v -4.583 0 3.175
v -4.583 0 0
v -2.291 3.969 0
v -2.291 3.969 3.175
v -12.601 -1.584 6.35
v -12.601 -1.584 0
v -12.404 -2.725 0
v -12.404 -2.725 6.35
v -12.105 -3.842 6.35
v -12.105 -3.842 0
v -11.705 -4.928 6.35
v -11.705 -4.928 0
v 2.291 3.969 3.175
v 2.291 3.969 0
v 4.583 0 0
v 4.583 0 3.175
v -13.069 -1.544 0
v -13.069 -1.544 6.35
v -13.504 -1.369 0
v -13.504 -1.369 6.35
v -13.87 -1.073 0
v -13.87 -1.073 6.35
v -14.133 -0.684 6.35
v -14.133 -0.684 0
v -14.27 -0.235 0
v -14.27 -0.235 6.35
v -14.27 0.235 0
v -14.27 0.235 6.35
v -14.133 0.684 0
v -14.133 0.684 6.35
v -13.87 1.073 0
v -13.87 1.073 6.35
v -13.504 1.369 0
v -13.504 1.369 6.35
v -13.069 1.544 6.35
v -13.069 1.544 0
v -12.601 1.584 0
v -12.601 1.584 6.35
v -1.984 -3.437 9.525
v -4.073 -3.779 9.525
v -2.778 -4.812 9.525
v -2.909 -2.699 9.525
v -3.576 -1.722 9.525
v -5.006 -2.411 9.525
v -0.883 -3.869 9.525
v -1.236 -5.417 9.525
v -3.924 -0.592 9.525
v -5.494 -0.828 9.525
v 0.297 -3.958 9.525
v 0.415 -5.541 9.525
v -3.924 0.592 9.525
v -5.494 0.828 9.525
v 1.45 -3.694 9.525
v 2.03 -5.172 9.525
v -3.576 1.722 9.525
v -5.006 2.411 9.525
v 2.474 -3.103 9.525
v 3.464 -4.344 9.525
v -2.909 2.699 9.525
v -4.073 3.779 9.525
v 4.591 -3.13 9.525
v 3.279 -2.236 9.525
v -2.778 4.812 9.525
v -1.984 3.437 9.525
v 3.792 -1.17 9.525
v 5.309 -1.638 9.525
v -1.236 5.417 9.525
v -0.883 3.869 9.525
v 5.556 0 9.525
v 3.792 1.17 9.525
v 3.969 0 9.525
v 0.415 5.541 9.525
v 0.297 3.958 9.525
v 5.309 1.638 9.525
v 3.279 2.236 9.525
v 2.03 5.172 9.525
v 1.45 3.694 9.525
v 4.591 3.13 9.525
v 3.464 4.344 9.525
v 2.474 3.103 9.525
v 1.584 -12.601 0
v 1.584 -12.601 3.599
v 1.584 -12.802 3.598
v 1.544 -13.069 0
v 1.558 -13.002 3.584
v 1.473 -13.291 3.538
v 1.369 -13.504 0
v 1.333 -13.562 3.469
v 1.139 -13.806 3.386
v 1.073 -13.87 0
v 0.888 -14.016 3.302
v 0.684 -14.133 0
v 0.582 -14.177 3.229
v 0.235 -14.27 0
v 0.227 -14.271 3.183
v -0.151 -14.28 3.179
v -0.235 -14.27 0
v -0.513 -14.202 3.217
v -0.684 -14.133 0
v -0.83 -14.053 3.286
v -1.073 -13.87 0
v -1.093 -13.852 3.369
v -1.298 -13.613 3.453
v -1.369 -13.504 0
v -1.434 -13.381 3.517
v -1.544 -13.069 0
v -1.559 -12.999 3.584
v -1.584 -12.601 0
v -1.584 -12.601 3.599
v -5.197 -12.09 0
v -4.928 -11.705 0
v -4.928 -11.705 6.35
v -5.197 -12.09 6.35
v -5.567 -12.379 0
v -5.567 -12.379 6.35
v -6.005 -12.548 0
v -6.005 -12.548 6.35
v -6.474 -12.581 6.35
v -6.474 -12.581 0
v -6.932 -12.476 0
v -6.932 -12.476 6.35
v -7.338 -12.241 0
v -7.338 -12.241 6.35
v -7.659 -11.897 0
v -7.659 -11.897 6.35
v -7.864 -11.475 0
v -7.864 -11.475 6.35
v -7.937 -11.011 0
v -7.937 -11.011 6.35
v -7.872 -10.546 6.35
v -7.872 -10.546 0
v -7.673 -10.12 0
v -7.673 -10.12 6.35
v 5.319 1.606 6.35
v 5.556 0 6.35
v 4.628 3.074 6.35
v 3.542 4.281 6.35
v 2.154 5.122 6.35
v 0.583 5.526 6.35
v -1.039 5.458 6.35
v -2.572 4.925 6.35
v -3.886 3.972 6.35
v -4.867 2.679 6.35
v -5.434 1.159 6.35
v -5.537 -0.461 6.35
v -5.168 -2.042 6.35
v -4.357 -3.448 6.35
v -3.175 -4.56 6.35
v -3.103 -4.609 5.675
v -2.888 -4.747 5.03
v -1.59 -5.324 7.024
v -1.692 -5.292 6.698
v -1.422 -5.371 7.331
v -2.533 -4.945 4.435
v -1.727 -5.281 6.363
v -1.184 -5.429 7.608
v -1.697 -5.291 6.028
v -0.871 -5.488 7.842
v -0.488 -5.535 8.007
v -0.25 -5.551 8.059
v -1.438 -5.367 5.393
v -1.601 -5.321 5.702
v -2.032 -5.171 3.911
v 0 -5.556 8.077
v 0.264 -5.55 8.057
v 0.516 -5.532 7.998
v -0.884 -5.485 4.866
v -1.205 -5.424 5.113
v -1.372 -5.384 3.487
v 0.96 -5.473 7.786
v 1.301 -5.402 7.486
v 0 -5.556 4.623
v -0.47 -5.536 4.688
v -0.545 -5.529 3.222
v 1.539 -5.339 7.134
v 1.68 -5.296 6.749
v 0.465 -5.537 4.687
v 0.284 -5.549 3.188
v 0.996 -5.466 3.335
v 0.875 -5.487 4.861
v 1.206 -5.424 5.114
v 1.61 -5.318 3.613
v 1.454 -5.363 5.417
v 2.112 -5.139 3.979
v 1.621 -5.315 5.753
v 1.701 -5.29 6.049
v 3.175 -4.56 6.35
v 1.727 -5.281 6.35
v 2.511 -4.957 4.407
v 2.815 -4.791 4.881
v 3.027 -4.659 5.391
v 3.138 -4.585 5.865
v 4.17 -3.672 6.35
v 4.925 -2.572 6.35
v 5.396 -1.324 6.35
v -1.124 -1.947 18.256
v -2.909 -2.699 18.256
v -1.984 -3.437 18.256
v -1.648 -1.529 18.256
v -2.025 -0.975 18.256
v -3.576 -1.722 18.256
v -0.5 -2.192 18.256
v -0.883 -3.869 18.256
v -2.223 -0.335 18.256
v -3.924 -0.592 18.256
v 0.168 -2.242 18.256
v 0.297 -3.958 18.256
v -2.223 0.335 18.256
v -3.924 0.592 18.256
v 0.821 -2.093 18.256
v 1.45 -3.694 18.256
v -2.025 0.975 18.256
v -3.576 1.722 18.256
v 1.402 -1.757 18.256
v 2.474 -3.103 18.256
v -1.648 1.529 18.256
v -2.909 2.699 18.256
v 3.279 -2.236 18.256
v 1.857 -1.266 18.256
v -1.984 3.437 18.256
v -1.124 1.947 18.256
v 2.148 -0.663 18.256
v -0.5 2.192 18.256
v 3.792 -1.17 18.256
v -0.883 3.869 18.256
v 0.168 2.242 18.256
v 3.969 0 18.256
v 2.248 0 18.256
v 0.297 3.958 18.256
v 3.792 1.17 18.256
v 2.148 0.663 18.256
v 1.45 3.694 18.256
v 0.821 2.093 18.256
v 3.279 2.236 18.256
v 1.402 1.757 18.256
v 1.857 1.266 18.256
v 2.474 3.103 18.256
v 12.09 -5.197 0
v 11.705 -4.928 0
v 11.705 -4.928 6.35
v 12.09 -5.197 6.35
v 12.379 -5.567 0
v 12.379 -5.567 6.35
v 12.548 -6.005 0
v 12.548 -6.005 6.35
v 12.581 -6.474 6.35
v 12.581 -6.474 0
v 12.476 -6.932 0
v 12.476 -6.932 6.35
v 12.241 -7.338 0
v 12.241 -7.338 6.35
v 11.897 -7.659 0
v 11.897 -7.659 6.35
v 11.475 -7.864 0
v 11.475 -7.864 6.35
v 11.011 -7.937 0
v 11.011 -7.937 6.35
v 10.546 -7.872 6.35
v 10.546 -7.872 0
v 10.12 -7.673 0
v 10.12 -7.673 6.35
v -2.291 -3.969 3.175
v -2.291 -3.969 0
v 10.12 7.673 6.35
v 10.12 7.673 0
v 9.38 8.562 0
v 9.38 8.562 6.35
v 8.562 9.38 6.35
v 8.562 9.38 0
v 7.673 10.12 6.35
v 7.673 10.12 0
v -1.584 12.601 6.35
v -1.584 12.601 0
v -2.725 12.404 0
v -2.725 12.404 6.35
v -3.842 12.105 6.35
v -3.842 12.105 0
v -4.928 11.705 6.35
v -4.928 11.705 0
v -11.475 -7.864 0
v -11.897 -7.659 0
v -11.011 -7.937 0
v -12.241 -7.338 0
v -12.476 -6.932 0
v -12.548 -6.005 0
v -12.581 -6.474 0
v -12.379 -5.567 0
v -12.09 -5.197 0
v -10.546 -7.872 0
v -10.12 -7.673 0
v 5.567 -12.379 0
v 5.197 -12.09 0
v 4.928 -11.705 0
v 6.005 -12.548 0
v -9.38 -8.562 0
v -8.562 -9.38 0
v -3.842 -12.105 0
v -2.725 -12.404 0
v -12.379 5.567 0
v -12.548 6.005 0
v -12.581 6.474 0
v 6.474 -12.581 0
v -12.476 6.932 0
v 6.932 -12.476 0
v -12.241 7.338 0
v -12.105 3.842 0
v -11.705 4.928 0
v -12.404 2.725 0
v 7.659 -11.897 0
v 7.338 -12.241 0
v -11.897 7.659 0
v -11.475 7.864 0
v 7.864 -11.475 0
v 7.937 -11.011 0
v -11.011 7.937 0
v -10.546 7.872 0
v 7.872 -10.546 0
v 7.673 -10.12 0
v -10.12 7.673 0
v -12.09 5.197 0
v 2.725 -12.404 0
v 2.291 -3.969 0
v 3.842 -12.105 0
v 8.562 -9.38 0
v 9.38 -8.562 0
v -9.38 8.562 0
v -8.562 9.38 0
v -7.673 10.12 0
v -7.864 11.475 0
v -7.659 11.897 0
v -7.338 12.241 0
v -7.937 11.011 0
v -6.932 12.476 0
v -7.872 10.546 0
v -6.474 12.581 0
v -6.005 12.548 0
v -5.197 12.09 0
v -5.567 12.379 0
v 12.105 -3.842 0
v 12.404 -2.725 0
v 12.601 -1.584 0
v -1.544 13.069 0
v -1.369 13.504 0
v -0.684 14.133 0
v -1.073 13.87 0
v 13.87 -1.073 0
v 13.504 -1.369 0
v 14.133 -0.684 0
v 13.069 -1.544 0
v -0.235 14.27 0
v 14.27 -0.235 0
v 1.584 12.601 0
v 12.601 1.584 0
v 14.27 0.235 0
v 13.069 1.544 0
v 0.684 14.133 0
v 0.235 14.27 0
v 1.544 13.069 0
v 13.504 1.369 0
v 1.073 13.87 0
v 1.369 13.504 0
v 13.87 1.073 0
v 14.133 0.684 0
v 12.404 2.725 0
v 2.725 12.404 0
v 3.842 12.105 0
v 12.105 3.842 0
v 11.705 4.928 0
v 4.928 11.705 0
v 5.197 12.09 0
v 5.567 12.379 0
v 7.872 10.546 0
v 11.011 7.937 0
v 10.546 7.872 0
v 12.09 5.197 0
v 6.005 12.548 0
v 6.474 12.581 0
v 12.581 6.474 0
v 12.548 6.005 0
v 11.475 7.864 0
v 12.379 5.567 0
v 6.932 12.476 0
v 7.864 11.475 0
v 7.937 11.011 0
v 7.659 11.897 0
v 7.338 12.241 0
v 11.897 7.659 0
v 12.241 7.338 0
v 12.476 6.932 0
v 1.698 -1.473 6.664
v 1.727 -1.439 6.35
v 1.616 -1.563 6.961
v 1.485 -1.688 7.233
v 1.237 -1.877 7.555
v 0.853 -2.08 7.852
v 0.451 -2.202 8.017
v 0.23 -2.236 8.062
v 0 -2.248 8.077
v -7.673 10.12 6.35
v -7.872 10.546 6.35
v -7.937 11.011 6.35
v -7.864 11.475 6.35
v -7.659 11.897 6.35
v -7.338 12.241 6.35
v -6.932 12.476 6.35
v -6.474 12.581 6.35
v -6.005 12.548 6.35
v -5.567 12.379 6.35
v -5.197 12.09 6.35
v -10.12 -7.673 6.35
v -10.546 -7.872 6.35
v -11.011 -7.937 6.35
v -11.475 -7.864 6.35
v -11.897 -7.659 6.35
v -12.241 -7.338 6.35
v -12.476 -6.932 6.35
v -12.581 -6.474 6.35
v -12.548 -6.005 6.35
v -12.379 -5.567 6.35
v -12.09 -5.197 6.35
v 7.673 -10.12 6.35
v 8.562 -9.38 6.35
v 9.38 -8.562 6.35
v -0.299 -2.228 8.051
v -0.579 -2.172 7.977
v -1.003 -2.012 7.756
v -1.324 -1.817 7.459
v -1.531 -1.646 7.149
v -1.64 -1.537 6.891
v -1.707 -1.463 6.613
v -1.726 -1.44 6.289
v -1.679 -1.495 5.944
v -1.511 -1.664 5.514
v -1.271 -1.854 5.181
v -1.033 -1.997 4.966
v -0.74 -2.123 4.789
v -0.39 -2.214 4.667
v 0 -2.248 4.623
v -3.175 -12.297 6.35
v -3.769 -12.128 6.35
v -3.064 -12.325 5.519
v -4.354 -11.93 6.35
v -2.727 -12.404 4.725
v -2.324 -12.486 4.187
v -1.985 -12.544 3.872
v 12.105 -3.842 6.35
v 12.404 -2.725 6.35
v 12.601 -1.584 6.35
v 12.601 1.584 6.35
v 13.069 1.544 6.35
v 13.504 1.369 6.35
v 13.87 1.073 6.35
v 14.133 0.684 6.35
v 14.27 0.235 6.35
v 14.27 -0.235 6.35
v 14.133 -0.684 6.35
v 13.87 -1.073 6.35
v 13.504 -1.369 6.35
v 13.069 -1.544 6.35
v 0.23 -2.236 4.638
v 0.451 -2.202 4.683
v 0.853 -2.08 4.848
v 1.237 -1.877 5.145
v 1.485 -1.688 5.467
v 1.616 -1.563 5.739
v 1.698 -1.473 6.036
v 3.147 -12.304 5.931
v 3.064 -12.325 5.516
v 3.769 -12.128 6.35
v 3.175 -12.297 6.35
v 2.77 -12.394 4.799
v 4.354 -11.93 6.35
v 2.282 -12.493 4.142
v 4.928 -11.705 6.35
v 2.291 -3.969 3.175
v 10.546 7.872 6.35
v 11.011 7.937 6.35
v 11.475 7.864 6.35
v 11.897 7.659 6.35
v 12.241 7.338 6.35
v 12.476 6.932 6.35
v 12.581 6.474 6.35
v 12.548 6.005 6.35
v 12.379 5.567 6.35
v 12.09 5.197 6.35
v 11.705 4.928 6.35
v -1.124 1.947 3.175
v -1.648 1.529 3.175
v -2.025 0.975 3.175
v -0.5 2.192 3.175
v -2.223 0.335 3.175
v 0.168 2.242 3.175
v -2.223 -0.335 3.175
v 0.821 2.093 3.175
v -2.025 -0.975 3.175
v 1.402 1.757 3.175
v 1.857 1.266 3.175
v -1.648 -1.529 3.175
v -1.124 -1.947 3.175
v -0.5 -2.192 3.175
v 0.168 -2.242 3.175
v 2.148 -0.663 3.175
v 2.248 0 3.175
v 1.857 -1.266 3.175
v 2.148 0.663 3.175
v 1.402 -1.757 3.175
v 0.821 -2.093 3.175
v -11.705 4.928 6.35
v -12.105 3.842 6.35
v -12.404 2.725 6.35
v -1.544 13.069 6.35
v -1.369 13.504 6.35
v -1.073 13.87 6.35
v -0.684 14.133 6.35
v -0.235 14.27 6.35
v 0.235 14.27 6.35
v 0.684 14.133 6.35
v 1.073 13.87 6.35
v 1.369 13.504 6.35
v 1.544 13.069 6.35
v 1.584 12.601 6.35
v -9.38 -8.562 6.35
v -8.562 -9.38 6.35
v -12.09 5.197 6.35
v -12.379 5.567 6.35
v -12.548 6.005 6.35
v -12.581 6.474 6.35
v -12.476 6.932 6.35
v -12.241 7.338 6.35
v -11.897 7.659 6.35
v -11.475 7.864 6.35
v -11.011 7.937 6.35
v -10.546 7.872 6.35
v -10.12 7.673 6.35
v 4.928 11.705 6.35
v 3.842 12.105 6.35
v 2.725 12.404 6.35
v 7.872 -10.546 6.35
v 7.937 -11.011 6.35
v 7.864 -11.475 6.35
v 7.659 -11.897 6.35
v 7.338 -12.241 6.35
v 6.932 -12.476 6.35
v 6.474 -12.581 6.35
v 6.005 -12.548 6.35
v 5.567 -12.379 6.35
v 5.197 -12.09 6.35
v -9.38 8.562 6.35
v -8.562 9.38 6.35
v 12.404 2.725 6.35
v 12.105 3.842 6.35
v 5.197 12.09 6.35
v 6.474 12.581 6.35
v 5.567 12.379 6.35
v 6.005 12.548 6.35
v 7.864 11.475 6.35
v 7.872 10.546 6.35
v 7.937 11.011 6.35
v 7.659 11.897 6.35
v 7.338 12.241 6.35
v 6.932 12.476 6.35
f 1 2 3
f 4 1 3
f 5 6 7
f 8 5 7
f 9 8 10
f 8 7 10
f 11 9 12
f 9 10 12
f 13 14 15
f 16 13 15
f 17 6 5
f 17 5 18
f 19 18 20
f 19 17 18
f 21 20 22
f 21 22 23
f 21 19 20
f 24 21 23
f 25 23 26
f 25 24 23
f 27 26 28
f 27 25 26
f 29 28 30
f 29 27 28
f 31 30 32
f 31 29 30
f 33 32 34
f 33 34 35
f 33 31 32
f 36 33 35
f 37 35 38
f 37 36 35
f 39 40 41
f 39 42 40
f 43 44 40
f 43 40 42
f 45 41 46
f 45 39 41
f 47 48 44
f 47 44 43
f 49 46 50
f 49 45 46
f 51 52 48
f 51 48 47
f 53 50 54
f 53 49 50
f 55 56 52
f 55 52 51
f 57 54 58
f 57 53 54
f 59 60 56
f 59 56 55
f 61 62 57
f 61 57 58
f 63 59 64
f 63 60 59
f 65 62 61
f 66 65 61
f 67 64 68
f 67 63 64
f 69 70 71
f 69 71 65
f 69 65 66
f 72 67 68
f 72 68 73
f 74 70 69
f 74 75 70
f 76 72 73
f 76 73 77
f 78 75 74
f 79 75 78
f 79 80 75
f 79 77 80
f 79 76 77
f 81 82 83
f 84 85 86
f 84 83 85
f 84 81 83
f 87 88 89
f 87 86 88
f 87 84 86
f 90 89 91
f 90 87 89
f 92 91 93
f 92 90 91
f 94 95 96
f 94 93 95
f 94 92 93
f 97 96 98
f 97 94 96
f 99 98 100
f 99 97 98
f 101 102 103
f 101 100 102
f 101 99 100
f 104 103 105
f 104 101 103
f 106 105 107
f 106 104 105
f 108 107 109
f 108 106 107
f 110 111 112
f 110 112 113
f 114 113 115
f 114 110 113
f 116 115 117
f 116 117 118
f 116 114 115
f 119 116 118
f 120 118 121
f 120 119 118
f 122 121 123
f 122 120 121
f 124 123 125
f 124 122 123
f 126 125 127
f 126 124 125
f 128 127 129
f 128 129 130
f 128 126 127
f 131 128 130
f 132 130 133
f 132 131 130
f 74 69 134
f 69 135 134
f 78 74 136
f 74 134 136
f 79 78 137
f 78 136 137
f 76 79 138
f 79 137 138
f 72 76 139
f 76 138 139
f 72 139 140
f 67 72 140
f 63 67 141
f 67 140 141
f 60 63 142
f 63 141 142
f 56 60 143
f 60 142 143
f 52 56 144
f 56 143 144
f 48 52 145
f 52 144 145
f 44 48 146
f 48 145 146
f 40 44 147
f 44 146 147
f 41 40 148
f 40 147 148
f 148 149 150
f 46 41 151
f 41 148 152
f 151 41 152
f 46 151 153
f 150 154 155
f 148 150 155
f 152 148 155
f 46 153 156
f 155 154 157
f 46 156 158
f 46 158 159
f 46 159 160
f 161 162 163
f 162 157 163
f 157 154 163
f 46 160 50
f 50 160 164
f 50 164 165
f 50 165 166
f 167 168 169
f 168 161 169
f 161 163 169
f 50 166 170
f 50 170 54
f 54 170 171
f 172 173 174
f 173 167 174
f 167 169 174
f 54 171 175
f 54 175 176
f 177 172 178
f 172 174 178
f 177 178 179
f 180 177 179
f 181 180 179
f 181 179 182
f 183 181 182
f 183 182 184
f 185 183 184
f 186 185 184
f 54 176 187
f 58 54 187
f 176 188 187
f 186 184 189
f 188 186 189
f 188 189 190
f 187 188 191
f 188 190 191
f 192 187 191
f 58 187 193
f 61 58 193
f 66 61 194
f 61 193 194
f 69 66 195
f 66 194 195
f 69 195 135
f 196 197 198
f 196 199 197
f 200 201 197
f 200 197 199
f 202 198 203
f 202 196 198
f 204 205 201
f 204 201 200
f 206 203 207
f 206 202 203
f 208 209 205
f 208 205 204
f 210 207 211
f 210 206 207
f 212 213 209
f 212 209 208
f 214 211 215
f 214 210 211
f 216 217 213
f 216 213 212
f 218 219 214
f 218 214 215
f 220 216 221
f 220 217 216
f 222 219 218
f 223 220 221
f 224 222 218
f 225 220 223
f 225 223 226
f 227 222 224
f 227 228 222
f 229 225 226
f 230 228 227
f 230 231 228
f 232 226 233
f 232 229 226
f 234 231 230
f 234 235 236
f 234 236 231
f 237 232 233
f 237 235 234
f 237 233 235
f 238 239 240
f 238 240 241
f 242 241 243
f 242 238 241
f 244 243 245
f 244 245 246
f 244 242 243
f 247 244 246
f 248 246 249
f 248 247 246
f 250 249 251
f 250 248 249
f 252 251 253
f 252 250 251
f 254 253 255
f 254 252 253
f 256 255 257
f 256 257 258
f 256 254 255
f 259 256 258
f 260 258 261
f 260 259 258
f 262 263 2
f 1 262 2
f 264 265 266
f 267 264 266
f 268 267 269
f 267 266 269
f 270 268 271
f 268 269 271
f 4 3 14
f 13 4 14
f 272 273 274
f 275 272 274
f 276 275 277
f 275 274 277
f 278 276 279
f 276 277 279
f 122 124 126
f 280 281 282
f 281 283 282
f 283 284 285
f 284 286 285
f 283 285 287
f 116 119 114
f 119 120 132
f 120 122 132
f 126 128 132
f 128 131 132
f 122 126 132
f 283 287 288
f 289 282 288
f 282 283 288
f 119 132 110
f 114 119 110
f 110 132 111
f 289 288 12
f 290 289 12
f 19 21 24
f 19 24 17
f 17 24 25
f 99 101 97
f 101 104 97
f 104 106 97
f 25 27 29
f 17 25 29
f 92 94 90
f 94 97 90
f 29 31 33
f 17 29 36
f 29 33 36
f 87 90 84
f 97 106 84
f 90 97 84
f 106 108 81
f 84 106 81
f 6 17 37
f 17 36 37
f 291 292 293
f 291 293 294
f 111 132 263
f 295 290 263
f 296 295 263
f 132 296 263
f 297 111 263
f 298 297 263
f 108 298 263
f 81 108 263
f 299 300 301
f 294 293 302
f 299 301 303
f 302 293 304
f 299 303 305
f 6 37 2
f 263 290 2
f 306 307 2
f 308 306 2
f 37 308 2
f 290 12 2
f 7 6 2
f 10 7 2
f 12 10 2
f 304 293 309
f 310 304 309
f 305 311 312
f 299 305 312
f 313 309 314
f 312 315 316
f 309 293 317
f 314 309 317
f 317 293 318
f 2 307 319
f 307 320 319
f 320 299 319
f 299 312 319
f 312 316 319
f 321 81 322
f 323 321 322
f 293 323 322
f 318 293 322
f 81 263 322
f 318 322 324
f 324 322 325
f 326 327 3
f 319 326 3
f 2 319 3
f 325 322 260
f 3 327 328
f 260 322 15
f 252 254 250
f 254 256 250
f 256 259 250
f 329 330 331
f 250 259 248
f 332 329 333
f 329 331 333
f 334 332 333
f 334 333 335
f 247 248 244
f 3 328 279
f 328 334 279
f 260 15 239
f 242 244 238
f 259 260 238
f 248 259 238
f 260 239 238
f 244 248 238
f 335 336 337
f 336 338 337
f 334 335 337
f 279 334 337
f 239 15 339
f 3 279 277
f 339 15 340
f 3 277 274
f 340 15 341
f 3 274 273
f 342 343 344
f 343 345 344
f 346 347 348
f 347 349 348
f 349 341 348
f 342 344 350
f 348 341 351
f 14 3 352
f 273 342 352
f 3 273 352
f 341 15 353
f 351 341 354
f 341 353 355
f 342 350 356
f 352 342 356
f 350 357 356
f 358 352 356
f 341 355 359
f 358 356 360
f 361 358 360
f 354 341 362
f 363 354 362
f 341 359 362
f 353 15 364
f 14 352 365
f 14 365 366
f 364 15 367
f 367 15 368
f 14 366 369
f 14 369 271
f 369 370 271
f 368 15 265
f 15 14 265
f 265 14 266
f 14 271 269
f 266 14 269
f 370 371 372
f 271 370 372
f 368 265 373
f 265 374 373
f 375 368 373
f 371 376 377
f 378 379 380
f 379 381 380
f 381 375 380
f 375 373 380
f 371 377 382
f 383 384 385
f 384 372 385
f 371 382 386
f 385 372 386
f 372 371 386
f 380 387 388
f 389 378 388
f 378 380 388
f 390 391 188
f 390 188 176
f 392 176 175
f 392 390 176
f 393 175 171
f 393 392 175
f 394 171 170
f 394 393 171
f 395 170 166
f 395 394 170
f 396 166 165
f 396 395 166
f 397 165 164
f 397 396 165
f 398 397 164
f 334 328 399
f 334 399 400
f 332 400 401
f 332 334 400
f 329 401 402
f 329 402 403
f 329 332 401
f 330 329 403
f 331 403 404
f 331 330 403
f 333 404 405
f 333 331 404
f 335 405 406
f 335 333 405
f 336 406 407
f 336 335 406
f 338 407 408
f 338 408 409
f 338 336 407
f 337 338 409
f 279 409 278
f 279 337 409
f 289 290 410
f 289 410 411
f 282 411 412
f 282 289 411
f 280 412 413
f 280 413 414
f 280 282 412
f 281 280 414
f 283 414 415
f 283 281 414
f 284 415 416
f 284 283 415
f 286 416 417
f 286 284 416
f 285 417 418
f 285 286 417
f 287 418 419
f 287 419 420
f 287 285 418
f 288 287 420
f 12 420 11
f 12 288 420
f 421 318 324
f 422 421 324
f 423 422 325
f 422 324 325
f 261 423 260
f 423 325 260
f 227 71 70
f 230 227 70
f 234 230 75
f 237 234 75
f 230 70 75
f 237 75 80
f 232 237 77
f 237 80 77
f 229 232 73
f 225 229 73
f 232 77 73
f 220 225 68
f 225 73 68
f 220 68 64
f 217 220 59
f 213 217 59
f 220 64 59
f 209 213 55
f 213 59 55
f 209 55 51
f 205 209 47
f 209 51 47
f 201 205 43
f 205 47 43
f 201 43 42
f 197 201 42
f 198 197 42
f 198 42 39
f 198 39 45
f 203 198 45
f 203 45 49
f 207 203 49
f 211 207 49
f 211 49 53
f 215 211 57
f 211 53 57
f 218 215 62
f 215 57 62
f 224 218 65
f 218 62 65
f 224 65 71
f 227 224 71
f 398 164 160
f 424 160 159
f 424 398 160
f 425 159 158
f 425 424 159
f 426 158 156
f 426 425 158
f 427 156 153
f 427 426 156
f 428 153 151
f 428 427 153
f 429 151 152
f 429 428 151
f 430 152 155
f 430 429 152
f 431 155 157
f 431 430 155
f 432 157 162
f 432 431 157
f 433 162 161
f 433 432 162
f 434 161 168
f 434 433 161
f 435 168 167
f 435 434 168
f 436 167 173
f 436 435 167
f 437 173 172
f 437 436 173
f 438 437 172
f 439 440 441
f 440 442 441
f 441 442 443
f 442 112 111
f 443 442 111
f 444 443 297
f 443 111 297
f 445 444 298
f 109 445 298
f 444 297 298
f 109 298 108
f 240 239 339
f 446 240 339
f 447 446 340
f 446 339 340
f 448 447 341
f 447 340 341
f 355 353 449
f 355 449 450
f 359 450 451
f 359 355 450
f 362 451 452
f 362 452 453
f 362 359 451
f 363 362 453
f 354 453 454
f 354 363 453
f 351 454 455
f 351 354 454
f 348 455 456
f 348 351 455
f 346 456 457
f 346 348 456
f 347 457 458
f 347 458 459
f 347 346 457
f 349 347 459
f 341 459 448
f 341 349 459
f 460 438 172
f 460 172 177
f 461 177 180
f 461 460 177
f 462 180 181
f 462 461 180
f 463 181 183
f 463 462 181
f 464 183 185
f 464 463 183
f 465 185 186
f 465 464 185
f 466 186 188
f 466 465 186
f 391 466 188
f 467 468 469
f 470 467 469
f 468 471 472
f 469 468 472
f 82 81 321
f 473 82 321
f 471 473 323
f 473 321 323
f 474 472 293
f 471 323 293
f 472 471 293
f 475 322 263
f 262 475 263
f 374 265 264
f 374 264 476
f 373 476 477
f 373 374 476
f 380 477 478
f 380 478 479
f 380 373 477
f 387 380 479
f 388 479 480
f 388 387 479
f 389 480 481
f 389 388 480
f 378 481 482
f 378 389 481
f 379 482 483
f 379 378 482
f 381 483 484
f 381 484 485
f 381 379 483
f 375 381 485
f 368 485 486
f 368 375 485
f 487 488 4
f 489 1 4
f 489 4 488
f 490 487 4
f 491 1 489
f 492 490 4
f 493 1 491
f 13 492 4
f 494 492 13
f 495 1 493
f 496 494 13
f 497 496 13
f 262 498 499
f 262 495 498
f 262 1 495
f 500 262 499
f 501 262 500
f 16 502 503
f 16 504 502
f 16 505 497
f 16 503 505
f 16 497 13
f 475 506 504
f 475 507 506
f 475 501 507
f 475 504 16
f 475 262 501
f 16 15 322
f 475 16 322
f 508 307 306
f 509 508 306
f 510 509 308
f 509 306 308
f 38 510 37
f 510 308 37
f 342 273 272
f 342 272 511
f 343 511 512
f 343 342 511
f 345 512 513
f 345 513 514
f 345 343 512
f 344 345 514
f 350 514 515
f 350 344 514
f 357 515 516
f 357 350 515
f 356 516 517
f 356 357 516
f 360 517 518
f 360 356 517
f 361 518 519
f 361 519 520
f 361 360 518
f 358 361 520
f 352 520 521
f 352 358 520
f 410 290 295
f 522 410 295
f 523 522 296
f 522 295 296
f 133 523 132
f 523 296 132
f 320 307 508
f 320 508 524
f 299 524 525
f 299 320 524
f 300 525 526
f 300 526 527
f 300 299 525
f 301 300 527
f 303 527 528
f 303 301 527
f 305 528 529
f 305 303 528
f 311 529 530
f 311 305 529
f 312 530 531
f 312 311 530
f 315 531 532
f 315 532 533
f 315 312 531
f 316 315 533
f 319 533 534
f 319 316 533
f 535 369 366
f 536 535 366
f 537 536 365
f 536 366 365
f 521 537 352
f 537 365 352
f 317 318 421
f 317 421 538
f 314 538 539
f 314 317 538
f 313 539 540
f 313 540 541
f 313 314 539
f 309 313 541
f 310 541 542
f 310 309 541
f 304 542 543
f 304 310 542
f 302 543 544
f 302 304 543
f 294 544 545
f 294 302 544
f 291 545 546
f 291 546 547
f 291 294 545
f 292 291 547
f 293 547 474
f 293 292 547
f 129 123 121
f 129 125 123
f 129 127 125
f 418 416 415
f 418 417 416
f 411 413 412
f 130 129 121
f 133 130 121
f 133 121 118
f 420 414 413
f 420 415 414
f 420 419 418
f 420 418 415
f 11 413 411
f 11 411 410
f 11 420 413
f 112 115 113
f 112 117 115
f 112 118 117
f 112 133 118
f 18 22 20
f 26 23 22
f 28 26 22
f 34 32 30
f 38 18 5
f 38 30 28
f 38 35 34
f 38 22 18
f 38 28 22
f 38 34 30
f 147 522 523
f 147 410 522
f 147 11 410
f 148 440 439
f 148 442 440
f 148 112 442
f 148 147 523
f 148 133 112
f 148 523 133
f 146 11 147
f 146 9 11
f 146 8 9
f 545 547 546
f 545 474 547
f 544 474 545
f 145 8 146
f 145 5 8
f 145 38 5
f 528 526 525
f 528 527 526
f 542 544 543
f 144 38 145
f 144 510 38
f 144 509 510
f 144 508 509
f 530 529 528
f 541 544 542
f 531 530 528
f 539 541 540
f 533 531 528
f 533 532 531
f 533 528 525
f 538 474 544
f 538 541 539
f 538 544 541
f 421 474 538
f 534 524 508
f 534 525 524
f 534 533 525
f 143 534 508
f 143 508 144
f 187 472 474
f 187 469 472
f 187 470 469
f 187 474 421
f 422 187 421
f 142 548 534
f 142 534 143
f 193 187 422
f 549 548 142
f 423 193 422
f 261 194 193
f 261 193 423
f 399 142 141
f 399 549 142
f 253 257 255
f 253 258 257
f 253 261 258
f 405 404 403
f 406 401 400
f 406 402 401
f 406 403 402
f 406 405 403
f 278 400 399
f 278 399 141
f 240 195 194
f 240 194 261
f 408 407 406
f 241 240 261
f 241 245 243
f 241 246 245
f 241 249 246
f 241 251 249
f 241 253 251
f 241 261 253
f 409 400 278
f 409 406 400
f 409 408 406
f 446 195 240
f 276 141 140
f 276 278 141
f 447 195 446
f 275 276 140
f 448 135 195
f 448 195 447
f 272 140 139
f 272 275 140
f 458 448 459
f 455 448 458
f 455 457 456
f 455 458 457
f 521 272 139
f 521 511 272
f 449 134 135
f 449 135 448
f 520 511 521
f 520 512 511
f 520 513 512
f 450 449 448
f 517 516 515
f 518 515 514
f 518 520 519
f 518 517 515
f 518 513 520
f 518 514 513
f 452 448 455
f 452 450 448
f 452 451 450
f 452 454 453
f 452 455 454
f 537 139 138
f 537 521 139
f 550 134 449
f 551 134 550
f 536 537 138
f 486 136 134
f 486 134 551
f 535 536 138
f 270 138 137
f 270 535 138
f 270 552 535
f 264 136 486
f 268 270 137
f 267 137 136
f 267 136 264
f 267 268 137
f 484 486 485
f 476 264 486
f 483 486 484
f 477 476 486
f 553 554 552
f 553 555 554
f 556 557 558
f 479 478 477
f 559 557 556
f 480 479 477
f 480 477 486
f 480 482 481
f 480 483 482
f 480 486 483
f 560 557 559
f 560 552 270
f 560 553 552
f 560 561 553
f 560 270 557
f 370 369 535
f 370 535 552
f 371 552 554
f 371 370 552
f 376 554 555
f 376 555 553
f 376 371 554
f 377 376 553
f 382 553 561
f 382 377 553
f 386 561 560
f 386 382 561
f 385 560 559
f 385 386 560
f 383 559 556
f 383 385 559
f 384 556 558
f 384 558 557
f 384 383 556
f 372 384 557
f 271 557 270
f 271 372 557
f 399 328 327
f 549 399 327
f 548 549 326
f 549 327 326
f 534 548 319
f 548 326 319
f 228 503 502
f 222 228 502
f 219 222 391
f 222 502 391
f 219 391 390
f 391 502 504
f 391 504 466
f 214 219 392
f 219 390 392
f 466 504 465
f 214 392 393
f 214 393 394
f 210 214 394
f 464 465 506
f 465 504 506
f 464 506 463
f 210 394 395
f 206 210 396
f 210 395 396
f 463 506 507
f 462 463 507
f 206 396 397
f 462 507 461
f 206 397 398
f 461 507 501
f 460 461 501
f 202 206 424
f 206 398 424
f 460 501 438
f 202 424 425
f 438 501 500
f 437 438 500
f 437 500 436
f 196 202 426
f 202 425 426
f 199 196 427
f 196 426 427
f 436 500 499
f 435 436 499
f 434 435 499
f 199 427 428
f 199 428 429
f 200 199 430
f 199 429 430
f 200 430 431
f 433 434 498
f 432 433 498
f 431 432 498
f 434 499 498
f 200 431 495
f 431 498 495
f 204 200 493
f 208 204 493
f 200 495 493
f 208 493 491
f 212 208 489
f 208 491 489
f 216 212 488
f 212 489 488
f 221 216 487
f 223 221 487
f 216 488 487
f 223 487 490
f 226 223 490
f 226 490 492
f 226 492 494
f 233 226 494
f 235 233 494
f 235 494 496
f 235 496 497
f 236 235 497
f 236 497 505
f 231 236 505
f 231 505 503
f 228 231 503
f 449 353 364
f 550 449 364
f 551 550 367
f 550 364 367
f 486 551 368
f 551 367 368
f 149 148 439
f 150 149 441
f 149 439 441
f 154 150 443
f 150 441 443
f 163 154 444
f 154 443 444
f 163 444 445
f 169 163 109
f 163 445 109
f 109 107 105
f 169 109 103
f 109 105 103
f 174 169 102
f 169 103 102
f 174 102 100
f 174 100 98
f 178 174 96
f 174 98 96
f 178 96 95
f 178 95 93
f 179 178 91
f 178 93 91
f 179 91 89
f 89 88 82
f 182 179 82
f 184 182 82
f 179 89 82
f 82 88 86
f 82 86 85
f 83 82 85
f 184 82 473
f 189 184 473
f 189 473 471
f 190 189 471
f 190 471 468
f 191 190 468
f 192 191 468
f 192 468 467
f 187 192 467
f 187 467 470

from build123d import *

# Parameters (mm, degrees)
F0_R           = 12.7
F1_DEPTH       = 6.35
F3_DEPTH       = 3.175
F4_R           = 5.55625
F5_DEPTH       = 3.175
F6_R           = 3.96875
F7_DEPTH       = 8.73125
F8_R           = 2.2479
F9_DEPTH       = 15.08125
F11_DEPTH      = 6.35
F12_COUNT      = 12
F12_ANGLE      = 330
F14_END_RADIUS = 5.55625
F14_REACH      = 18.1506366107
F17_END_RADIUS = 5.55625
F17_REACH      = 35.6755158286


with BuildPart() as f1:
    # F0 (on Top) → F1 (new body)
    with BuildSketch(Plane.XY):
        Circle(F0_R)
    extrude(amount=F1_DEPTH)

    # F2 (on face) → F3 (cut)
    with BuildSketch(Plane(origin=(0, 0, 0), x_dir=(1, 0, 0), z_dir=(0, 0, -1))):
        Polygon((2.2913588808, 3.96875), (-2.2913588808, 3.96875), (-4.5827177617, 0), (-2.2913588808, -3.96875), (2.2913588808, -3.96875), (4.5827177617, 0), align=None)
    extrude(amount=-F3_DEPTH, mode=Mode.SUBTRACT)

    # F4 (on face) → F5 (join)
    with BuildSketch(Plane.XY.offset(6.35)):
        Circle(F4_R)
    extrude(amount=F5_DEPTH)

    # F6 (on face) → F7 (join)
    with BuildSketch(Plane.XY.offset(9.525)):
        Circle(F6_R)
    extrude(amount=F7_DEPTH)

    # F8 (on face) → F9 (cut, through all)
    with BuildSketch(Plane(origin=(0, 0, 3.175), x_dir=(1, 0, 0), z_dir=(0, 0, -1))):
        Circle(F8_R)
    extrude(amount=-F9_DEPTH, mode=Mode.SUBTRACT)

    # F10 (on face) → F11 (join, through all)
    with BuildSketch(Plane(origin=(0, 0, 0), x_dir=(1, 0, 0), z_dir=(0, 0, -1))):
        with BuildLine():
            ThreePointArc((-1.5843963802, 12.60078125), (0, 12.7), (1.5843963802, 12.60078125))
            ThreePointArc((1.5843963802, 12.60078125), (0, 14.2875), (-1.5843963802, 12.60078125))
        make_face()
    f11 = extrude(amount=-F11_DEPTH)

    # F12: F11 ×12 about axis
    f12_axis = Axis((0, 0, 0), (0, 0, -1))
    for i in range(1, F12_COUNT):
        add(f11.rotate(f12_axis, i * F12_ANGLE / (F12_COUNT - 1)))

    f14_end = (Plane(origin=(0, 0, 7.9375), x_dir=(-1, 0, 0), z_dir=(0, 0, -1)) * Cylinder(F14_END_RADIUS, 124.9884067655, mode=Mode.PRIVATE)).faces().sort_by_distance((-5.55625, 0, 7.9375))[0]
    # F13 (on Front) → F14 (cut, up to the whole of a round face its end follows)
    with BuildSketch(Plane.XZ):
        with BuildLine():
            ThreePointArc((0, 8.0772), (-1.7272, 6.35), (0, 4.6228))
            Line((0, 4.6228), (0, 8.0772))
        make_face()
        with BuildLine():
            Line((0, 8.0772), (0, 4.6228))
            ThreePointArc((0, 4.6228), (1.2213148325, 5.1286851675), (1.7272, 6.35))
            ThreePointArc((1.7272, 6.35), (1.2213148325, 7.5713148325), (0, 8.0772))
        make_face()
    f14_long = extrude(amount=F14_REACH, mode=Mode.PRIVATE)
    add(split(f14_long, bisect_by=f14_end, keep=Keep.BOTTOM, mode=Mode.PRIVATE), mode=Mode.SUBTRACT)

    f17_end = (Plane(origin=(0, 0, 7.9375), x_dir=(-1, 0, 0), z_dir=(0, 0, -1)) * Cylinder(F17_END_RADIUS, 160.0381652835, mode=Mode.PRIVATE)).faces().sort_by_distance((-5.55625, 0, 7.9375))[0]
    # F16 (on offset) → F17 (cut, up to the whole of a round face its end follows)
    with BuildSketch(Plane.XZ.offset(14.2875)):
        with BuildLine():
            Line((3.175, 6.35), (-3.175, 6.35))
            ThreePointArc((-3.175, 6.35), (0, 3.175), (3.175, 6.35))
        make_face()
    f17_long = extrude(amount=-F17_REACH, mode=Mode.PRIVATE)
    add(split(f17_long, bisect_by=f17_end, keep=Keep.ALL, mode=Mode.PRIVATE).solids().sort_by_distance((0, -14.2875, 5.0024881485))[0], mode=Mode.SUBTRACT)


solid = f1.part
